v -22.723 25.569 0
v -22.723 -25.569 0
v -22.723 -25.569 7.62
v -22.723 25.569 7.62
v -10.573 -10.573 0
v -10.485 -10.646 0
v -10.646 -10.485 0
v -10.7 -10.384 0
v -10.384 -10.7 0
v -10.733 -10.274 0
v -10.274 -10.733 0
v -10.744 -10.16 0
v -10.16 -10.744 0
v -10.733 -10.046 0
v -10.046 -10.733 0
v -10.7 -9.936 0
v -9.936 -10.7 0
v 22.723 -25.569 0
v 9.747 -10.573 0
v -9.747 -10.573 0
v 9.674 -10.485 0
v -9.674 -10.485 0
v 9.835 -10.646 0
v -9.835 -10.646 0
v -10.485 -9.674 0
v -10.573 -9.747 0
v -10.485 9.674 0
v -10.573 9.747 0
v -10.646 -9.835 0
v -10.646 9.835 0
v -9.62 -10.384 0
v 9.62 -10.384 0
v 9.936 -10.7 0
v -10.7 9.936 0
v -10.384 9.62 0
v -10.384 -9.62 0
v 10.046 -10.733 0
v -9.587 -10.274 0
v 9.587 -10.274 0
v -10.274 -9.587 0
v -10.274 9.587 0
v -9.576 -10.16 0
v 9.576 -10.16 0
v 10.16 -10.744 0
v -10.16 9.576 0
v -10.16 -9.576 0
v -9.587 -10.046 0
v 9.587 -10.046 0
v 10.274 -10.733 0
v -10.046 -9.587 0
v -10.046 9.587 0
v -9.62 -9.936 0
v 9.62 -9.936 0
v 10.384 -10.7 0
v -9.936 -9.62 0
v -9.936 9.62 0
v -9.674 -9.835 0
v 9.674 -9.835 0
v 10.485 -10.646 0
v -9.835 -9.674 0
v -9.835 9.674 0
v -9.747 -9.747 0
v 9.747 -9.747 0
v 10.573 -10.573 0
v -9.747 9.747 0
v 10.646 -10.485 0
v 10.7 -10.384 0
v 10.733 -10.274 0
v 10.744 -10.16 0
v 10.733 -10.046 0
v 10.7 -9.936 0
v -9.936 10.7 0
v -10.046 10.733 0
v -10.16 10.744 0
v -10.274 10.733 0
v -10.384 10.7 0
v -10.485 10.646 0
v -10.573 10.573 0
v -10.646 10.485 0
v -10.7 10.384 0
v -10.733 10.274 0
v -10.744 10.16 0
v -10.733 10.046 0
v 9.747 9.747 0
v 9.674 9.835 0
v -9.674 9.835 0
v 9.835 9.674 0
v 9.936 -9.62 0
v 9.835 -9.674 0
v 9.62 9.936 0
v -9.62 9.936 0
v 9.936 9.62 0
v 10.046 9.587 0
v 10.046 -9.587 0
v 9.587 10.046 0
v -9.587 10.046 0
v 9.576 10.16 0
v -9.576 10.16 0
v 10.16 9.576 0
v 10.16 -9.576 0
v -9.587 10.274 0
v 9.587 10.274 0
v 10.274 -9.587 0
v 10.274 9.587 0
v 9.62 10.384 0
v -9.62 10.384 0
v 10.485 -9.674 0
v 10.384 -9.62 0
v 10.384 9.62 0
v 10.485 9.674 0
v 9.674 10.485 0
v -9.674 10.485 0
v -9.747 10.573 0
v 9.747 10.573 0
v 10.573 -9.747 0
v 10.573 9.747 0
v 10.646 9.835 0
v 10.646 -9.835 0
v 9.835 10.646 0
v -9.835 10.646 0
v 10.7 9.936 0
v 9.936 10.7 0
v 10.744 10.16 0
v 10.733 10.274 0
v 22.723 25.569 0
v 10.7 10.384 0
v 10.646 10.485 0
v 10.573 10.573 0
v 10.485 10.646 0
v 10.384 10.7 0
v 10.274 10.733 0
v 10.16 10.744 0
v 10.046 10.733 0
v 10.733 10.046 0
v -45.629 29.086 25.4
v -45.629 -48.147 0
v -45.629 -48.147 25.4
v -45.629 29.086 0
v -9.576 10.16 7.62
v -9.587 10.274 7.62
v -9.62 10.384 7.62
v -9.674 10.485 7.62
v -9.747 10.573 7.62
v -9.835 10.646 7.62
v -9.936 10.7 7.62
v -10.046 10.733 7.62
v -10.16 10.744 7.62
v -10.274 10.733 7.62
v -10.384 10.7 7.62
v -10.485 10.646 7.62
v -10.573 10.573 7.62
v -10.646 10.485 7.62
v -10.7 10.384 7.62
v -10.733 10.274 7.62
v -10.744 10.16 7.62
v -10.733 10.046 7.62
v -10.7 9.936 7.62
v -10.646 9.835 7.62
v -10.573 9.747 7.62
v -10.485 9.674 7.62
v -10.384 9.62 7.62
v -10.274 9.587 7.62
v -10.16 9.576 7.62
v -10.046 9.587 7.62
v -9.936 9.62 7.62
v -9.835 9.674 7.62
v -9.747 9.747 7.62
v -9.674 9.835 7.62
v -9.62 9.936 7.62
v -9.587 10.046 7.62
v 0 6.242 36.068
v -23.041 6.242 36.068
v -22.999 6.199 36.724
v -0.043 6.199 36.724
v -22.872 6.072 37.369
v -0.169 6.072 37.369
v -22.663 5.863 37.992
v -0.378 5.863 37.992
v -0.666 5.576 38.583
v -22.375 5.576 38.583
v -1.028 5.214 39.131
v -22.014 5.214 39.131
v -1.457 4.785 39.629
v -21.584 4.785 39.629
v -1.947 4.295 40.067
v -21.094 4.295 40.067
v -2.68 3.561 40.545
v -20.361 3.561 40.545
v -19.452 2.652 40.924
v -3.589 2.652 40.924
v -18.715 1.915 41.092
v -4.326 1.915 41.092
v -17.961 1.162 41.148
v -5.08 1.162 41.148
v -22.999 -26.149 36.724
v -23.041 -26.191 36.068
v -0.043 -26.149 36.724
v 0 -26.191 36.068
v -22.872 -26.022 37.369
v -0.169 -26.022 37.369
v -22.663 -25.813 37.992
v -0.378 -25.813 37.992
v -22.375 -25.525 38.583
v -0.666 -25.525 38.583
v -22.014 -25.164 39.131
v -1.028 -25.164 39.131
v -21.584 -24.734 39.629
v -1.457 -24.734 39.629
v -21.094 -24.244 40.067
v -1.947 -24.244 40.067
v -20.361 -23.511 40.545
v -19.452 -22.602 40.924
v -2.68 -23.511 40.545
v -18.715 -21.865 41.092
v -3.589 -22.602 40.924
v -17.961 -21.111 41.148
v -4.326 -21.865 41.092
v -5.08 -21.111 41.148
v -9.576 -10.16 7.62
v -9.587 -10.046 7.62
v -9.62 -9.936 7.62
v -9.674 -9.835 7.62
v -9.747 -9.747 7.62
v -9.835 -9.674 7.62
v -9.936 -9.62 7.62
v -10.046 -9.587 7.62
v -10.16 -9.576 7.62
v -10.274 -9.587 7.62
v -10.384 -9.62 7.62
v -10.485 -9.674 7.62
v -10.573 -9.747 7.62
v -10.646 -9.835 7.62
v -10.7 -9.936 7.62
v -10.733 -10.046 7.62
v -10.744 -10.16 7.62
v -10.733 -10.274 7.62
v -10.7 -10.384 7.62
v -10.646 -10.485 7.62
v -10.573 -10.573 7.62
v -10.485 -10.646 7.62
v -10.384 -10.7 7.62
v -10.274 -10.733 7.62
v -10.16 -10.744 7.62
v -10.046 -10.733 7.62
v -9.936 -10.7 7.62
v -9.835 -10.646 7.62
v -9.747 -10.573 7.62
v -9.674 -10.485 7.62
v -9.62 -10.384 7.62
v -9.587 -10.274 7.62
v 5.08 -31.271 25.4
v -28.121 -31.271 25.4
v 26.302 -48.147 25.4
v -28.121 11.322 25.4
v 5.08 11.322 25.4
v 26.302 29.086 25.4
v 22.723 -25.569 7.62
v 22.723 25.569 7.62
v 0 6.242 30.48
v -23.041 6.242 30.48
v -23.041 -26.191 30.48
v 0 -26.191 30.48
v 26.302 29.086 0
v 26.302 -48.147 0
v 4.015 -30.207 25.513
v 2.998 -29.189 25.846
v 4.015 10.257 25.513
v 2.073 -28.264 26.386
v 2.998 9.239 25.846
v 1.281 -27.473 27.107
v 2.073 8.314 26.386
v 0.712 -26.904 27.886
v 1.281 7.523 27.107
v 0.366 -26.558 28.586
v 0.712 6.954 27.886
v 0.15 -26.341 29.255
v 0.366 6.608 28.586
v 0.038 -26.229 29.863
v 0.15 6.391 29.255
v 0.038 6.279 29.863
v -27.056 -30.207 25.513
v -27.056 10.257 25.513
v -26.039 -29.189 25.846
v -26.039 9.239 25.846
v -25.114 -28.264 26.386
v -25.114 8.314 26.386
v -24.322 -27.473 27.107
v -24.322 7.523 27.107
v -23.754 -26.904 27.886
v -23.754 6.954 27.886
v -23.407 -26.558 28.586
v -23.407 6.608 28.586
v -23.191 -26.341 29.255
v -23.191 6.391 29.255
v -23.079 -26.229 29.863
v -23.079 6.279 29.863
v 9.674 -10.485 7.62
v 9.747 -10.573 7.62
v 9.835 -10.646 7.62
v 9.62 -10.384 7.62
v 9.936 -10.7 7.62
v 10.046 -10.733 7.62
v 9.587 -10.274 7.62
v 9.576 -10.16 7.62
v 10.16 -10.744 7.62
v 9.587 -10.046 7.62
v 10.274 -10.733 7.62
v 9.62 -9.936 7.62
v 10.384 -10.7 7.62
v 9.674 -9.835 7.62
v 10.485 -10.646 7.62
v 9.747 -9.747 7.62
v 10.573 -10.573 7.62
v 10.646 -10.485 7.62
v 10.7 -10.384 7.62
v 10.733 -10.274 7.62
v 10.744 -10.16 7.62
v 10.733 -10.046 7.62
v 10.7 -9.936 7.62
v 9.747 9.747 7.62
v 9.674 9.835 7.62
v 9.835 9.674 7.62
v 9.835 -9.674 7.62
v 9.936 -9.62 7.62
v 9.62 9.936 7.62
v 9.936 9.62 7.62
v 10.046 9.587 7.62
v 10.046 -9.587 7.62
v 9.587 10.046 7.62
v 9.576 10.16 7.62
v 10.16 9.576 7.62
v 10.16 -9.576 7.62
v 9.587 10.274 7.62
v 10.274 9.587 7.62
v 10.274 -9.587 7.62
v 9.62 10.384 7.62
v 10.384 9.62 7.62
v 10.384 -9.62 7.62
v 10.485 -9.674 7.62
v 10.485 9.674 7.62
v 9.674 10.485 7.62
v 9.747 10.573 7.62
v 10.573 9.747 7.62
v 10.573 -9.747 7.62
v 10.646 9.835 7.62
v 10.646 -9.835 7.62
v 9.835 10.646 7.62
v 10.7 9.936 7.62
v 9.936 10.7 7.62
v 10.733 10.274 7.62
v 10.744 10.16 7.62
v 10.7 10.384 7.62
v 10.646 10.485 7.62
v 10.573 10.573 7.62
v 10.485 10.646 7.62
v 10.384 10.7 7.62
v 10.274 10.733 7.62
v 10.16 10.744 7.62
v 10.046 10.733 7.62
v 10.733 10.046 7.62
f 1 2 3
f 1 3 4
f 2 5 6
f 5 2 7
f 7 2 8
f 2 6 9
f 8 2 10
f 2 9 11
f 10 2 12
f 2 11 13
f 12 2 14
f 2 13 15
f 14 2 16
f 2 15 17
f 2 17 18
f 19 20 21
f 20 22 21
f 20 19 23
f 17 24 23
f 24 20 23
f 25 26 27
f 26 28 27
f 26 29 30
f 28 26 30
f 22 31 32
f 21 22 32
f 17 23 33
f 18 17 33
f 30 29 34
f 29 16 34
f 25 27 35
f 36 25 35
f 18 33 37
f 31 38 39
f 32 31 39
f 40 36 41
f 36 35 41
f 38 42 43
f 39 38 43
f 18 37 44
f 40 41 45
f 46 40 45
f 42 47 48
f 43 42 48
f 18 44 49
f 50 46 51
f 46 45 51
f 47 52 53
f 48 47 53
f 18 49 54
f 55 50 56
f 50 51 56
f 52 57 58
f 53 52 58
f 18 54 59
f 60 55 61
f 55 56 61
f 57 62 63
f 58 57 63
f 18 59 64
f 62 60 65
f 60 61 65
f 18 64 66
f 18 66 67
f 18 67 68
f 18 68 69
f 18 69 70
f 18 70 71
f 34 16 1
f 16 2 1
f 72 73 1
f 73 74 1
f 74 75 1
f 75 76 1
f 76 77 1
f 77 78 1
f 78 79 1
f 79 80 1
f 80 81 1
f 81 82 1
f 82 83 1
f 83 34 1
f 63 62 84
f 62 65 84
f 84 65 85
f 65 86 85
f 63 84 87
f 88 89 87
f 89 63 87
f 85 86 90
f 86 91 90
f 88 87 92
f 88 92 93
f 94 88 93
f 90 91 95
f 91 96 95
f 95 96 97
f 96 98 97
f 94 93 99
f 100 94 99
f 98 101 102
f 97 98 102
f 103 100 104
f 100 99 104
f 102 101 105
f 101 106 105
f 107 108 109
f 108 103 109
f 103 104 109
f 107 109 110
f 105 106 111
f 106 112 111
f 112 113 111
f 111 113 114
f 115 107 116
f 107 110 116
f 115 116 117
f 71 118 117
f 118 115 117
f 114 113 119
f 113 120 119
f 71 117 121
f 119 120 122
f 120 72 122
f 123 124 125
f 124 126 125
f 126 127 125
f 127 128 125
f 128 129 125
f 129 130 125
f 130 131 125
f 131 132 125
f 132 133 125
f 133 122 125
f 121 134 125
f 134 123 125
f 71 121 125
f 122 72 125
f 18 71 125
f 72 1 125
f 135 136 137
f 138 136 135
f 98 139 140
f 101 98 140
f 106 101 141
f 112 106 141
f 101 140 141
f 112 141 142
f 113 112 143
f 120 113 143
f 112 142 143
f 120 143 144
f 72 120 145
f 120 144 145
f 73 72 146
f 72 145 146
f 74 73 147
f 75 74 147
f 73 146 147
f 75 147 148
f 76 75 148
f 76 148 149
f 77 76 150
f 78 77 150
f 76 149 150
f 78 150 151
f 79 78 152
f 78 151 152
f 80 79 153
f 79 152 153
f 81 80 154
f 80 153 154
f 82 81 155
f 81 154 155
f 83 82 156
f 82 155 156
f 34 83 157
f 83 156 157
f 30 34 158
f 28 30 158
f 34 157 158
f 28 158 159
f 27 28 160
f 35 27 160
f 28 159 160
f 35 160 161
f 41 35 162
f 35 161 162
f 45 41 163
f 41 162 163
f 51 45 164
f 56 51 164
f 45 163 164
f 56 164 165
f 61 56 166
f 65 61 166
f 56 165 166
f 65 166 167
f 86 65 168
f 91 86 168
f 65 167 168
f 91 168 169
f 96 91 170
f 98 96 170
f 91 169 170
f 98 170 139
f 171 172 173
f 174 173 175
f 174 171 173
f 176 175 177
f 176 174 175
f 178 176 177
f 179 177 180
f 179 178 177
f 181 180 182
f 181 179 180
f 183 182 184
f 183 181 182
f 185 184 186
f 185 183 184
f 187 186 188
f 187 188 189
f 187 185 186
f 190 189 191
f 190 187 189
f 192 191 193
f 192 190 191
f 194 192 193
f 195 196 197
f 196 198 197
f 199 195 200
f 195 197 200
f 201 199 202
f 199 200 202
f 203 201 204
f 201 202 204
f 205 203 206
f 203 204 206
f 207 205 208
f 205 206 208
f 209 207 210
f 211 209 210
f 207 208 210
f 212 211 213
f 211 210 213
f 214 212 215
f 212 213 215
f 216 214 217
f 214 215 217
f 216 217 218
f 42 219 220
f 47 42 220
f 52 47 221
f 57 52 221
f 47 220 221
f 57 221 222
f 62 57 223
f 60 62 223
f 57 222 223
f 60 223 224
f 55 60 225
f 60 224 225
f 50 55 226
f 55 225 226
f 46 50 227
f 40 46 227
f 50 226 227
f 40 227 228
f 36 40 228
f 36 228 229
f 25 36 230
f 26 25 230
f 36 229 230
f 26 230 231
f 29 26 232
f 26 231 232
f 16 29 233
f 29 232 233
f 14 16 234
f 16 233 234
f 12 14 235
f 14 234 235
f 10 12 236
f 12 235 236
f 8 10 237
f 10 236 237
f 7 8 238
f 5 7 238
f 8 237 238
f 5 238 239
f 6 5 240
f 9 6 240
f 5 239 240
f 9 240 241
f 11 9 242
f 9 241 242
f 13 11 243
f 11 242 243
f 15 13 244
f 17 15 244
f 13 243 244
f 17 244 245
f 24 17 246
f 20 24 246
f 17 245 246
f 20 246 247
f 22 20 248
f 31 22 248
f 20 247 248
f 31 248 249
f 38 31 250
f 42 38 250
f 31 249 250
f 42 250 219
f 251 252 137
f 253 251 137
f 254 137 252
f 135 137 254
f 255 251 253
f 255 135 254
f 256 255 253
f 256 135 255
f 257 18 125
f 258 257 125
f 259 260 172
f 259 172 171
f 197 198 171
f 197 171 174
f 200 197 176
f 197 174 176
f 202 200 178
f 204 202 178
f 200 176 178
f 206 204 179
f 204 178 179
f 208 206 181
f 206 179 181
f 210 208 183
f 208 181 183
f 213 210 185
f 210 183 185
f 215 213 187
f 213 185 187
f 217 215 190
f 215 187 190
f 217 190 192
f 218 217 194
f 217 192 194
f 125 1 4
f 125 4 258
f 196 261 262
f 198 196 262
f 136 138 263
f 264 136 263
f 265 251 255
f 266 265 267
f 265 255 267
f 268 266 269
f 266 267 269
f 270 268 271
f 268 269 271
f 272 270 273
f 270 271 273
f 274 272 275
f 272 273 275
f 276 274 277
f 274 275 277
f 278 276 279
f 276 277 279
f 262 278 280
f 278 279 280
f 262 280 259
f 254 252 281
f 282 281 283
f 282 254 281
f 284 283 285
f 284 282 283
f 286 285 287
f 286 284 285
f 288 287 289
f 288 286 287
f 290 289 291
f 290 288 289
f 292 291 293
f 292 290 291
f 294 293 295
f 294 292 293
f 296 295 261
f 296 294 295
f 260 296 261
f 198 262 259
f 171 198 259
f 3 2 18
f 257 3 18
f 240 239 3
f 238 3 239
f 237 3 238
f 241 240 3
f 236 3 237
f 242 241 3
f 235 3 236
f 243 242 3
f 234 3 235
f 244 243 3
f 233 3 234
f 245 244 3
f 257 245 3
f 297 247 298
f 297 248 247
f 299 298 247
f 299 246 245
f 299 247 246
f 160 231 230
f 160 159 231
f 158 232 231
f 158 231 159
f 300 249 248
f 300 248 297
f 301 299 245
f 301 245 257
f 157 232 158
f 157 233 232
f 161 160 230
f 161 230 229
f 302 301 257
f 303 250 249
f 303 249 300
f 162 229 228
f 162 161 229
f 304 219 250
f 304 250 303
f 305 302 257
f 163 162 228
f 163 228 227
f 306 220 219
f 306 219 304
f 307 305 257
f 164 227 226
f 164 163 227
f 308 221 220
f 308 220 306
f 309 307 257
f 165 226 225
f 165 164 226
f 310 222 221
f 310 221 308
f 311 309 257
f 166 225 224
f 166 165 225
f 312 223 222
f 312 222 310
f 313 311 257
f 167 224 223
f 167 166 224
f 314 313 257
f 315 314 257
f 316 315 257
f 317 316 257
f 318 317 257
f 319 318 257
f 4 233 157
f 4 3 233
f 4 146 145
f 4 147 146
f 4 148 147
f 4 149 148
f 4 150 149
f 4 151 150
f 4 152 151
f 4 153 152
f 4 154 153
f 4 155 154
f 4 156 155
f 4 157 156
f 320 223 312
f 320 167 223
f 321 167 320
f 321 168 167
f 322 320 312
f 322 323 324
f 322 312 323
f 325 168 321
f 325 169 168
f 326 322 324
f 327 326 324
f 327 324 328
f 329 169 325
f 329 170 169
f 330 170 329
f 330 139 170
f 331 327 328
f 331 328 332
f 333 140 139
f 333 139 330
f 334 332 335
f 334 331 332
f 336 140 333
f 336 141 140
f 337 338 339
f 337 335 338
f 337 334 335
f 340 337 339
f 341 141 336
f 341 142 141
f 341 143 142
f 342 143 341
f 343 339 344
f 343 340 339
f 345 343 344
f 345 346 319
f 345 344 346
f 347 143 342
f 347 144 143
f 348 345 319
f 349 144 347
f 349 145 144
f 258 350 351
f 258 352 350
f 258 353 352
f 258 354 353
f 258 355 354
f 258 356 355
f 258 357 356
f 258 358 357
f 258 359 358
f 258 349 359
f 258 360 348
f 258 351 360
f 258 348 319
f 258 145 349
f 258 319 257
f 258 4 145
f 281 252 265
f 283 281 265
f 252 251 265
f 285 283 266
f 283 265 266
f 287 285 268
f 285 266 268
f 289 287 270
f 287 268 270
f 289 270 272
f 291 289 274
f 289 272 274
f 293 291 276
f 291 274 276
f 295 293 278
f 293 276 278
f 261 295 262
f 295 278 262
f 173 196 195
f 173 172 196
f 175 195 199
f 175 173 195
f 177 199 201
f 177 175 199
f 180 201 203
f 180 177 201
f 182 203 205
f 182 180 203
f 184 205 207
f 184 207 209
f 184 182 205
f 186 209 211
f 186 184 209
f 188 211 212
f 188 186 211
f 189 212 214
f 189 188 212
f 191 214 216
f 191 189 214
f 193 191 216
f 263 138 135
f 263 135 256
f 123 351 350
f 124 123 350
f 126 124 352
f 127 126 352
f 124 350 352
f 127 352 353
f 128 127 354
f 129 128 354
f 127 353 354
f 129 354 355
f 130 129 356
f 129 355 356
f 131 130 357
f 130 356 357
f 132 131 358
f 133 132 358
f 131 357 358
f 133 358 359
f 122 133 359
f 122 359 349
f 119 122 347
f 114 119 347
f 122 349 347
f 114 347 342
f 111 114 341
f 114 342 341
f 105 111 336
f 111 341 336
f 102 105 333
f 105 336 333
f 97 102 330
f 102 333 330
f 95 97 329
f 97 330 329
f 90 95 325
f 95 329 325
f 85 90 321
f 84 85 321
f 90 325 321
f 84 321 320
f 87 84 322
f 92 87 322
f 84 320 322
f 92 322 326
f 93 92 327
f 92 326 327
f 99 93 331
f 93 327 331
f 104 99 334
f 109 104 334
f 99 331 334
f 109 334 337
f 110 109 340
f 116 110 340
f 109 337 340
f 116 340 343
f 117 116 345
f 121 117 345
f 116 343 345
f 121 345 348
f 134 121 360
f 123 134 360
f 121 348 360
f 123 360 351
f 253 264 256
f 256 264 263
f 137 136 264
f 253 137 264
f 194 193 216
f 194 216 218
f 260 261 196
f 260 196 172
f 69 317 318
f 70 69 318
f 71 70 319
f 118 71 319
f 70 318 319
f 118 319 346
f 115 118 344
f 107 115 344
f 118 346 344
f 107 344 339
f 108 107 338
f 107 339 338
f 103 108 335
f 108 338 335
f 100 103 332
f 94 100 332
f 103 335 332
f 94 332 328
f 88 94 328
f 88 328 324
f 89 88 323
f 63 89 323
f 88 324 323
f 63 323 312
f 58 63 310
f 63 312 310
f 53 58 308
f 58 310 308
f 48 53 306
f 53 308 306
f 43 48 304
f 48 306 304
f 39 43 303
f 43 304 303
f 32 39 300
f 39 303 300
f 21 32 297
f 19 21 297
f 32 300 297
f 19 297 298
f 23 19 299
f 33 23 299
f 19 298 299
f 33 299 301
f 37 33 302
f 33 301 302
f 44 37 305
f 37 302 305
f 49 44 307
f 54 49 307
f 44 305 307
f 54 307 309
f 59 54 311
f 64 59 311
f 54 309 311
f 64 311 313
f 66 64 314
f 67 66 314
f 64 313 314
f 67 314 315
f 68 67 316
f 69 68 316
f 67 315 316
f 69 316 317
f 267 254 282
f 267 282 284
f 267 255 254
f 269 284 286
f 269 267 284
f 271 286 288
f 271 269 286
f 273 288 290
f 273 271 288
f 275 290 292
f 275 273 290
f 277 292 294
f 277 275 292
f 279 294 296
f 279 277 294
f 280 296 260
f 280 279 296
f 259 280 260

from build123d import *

# Parameters (mm, degrees)
F0_W     = 23.0411533266
F0_H     = 32.4329454452
F1_DEPTH = 41.148
F2_W     = 71.9308368862
F2_H     = 77.2322397679
F3_DEPTH = 25.4
F4_R     = 5.08
F5_W     = 45.4457737505
F5_H     = 51.1372797191
F6_DEPTH = 7.62
F7_R     = 0.5842
F8_DEPTH = 7.62


with BuildPart() as f1:
    # F0 (on Top) → F1 (new body)
    with BuildSketch(Plane.XY):
        with Locations((-11.5205766633, -9.9749034271)):
            Rectangle(F0_W, F0_H)
    extrude(amount=F1_DEPTH)

    # F2 (on Top) → F3 (join)
    with BuildSketch(Plane.XY):
        with Locations((-9.6630994231, -9.5305936411)):
            Rectangle(F2_W, F2_H)
    extrude(amount=F3_DEPTH)

    # F4
    f4_edges = [f1.edges().sort_by_distance(p)[0] for p in [
        (-23.041153, -9.974903, 25.4),
        (-11.520577, -26.191376, 25.4),
        (0, -9.974903, 25.4),
        (-11.520577, 6.241569, 25.4),
        (-11.520577, 6.241569, 41.148),
        (-23.041153, -9.974903, 41.148),
        (-11.520577, -26.191376, 41.148),
        (0, -9.974903, 41.148),
    ]]
    fillet(f4_edges, radius=F4_R)


with BuildPart() as f6:
    # F5 (on Top) → F6 (new body)
    with BuildSketch(Plane.XY):
        Rectangle(F5_W, F5_H)
    extrude(amount=F6_DEPTH)

    # F7 (on face) → F8 (cut, through all)
    with BuildSketch(Plane.XY.offset(7.62)):
        with Locations((10.16, -10.16)):
            Circle(F7_R)
        with Locations((10.16, 10.16)):
            Circle(F7_R)
        with Locations((-10.16, 10.16)):
            Circle(F7_R)
        with Locations((-10.16, -10.16)):
            Circle(F7_R)
    extrude(amount=-F8_DEPTH, mode=Mode.SUBTRACT)


solid = Compound([f1.part, f6.part])
